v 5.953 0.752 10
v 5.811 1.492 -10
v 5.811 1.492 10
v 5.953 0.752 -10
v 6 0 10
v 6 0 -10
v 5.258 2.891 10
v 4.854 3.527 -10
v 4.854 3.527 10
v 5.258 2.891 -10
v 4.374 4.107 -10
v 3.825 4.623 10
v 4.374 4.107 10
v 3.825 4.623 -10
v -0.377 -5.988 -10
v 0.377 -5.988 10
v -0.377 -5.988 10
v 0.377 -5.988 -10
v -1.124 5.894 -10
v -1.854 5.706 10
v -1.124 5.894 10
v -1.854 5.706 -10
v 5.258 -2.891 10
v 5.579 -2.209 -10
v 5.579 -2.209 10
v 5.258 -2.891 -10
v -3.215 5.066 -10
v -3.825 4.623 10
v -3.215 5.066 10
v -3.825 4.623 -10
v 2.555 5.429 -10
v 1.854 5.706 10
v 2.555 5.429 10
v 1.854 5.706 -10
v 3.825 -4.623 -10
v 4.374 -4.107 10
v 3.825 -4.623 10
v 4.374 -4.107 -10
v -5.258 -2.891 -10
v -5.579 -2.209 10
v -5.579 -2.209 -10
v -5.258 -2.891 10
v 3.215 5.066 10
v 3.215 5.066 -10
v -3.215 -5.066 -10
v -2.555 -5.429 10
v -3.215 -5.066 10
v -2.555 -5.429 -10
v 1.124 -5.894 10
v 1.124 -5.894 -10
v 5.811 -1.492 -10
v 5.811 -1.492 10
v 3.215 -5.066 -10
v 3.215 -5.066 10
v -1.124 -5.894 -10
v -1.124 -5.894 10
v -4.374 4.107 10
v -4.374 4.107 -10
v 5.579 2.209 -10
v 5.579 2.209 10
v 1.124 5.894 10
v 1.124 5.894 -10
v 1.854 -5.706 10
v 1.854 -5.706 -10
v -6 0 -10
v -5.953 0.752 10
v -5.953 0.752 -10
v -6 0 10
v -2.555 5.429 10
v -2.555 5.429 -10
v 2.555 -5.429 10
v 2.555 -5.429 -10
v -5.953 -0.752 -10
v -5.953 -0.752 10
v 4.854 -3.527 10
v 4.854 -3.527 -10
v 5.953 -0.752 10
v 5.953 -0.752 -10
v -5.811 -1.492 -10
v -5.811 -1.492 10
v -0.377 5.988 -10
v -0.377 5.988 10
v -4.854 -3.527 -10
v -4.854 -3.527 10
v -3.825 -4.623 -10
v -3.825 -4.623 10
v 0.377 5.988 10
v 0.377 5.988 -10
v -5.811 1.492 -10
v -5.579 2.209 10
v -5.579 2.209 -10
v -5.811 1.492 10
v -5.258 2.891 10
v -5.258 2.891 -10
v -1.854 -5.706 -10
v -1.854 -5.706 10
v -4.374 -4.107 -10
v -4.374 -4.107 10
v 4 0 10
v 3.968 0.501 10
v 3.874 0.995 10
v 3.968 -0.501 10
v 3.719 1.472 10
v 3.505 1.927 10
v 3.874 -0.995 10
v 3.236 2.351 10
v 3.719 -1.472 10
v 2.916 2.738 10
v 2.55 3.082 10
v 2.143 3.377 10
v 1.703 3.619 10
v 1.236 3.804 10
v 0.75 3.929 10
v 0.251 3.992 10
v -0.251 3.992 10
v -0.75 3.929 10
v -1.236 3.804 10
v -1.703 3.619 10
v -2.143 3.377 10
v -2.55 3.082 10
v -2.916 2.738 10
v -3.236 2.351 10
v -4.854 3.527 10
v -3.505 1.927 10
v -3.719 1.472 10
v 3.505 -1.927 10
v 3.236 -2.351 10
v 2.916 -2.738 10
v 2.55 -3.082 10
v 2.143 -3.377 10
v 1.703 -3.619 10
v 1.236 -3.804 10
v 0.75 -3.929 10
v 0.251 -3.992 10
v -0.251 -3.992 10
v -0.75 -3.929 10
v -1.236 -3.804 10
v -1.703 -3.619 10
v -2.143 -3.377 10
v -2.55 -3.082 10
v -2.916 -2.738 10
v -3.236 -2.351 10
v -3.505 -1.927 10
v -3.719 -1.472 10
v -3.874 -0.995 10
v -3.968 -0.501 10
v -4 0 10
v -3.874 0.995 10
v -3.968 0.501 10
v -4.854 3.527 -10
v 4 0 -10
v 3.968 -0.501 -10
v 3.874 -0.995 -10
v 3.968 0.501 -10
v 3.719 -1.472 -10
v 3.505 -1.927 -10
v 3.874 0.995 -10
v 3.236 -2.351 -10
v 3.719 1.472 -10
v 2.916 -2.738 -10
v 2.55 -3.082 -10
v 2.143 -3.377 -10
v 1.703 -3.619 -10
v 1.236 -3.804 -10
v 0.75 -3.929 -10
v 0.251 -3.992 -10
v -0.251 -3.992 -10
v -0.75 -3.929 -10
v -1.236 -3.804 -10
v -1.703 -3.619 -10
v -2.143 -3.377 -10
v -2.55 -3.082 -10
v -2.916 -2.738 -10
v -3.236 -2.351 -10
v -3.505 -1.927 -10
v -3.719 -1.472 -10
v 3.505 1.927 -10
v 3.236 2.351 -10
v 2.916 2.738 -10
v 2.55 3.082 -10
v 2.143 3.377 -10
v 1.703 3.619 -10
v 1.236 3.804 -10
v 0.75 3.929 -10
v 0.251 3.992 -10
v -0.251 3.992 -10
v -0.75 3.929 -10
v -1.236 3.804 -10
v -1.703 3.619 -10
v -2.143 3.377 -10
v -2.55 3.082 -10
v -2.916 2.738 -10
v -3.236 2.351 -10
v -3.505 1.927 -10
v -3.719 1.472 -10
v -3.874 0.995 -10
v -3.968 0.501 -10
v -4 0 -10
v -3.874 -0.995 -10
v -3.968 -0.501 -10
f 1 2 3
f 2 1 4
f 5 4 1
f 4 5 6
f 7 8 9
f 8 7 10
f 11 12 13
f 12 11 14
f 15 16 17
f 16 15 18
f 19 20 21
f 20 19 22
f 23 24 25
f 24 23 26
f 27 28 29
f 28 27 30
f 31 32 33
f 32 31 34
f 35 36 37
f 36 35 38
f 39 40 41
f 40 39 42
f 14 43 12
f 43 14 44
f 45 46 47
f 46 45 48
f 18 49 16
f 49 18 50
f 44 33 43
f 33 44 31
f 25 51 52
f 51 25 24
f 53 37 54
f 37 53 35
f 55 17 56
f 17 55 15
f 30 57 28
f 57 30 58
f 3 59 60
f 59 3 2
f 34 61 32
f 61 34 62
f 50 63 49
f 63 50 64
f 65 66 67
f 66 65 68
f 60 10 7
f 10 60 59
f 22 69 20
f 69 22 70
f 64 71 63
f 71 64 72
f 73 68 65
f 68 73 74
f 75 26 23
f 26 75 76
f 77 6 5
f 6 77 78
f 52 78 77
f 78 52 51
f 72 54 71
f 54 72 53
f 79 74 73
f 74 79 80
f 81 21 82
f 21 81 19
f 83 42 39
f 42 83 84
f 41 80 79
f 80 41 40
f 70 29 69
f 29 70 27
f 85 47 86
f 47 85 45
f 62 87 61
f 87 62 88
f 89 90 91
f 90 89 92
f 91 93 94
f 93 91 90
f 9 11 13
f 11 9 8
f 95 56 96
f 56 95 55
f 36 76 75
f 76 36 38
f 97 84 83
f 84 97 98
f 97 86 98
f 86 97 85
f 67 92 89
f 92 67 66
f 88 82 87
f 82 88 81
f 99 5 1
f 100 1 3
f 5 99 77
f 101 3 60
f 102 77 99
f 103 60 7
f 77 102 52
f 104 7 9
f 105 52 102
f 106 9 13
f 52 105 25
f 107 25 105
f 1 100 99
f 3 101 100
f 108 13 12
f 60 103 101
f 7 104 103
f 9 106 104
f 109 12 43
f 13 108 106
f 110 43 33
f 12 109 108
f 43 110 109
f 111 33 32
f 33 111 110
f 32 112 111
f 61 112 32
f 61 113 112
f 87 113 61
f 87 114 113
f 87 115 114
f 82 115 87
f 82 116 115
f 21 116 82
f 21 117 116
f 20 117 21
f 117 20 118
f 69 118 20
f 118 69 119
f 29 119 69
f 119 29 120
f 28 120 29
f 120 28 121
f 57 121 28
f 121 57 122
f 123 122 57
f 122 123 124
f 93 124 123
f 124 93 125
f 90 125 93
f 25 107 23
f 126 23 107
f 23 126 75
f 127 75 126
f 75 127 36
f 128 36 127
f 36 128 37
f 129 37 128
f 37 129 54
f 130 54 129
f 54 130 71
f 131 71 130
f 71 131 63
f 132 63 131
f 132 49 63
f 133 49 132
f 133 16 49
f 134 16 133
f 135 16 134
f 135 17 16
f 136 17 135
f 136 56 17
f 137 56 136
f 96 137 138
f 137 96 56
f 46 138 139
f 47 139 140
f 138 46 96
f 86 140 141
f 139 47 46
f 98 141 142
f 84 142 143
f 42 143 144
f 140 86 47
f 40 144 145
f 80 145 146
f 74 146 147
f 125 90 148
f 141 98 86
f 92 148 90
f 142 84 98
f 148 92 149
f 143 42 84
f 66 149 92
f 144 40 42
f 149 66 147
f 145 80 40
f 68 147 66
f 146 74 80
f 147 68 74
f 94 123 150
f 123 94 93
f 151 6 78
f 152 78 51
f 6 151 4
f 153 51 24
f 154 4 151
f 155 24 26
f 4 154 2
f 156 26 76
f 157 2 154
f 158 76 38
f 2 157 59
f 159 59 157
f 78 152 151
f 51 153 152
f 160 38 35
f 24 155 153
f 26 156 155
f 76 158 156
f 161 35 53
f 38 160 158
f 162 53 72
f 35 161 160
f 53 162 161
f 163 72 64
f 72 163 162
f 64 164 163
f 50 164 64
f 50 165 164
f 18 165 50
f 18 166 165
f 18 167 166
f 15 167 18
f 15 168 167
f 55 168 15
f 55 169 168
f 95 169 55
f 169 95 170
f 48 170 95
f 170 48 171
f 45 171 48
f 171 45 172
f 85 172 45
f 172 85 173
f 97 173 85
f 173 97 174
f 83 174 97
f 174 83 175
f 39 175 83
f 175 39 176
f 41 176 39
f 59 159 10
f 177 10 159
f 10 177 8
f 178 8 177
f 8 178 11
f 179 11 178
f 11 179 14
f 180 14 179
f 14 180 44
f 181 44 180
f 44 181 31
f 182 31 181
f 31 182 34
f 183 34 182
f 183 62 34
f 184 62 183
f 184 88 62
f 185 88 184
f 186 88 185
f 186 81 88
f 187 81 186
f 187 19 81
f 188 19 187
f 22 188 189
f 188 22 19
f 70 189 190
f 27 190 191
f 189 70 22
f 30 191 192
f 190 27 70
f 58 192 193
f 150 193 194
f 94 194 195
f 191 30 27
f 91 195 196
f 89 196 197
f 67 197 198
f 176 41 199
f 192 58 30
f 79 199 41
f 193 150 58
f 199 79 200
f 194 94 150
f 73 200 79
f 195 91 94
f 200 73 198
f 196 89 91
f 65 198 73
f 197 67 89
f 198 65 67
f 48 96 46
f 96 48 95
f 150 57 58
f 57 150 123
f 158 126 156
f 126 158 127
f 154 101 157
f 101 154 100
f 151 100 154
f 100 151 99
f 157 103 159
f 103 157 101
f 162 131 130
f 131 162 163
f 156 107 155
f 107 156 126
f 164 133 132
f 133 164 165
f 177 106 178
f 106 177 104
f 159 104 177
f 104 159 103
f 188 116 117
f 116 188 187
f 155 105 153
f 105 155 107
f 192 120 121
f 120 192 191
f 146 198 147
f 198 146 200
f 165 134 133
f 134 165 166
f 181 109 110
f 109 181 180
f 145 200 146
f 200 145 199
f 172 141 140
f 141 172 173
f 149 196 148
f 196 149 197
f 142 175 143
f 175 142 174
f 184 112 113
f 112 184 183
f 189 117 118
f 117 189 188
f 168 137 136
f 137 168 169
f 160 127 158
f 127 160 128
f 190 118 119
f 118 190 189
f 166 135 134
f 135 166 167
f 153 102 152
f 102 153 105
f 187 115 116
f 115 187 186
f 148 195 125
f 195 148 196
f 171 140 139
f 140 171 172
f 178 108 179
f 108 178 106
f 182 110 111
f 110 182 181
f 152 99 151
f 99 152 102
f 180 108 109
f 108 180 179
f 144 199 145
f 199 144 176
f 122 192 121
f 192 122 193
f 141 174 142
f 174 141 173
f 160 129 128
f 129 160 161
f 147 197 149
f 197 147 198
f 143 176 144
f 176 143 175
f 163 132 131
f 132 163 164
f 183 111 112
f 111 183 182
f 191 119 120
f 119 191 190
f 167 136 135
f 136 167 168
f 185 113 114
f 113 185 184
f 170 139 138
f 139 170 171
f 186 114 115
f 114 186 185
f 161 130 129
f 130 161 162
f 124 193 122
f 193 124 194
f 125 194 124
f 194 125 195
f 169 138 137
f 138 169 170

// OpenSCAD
$fn = 50;


difference() {
	union() {
		translate(v = [0, 0, -10.0000000000]) {
			cylinder(h = 20, r = 6.0000000000);
		}
	}
	union() {
		translate(v = [0, 0, -100.0000000000]) {
			cylinder(h = 200, r = 4.0000000000);
		}
	}
}
